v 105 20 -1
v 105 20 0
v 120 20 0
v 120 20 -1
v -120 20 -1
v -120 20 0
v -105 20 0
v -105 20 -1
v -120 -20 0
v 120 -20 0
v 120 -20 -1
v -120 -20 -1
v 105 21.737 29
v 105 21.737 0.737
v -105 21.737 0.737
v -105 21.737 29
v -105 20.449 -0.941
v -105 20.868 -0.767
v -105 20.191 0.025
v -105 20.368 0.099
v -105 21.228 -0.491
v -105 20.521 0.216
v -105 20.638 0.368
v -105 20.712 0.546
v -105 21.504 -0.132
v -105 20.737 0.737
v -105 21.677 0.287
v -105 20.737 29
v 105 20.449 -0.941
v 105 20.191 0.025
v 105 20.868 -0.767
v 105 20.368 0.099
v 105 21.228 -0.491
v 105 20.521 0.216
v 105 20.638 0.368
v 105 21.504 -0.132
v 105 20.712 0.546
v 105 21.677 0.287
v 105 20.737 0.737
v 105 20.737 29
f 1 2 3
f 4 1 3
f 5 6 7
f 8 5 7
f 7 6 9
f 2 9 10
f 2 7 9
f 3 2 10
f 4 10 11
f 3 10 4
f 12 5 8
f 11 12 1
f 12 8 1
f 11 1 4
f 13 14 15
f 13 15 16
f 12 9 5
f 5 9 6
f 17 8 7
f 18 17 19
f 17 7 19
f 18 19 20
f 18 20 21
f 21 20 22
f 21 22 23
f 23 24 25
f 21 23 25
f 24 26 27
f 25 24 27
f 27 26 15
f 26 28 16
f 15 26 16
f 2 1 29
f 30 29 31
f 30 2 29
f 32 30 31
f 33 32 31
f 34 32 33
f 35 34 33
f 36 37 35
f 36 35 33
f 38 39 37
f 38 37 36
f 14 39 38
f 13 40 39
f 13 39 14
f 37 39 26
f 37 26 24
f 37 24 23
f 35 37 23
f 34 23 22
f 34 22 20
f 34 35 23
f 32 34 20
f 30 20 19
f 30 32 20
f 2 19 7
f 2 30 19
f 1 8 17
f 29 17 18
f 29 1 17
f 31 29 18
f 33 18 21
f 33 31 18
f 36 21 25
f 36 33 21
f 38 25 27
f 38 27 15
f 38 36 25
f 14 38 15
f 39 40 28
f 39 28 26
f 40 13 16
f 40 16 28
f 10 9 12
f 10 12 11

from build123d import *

# Parameters (mm, degrees)
SKETCH_1_W             = 240
SKETCH_1_H             = 40
SM_BASE_FLANGE_1_DEPTH = 1
SM_EDGE_FLANGE_1_DEPTH = 210


# Sheet-metal steps are written as plain solids
with BuildPart() as part:
    # Sketch 1 → 基体-法兰1 (new body)
    with BuildSketch(Plane.XY):
        Rectangle(SKETCH_1_W, SKETCH_1_H)
    extrude(amount=-SM_BASE_FLANGE_1_DEPTH)

    # 边线-法兰1 section (across the edge) → 边线-法兰1 (add)
    with BuildSketch(Plane(origin=(105, 20.7366, 0), x_dir=(0, -1, 0), z_dir=(-1, 0, 0))):
        with BuildLine():
            Line((-1, 0.7366), (-1, 29))
            Line((-1, 29), (0, 29))
            Line((0, 29), (0, 0.7366))
            ThreePointArc((0, 0.7366), (0.215745145, 0.215745145), (0.7366, 0))
            Line((0.7366, 0), (0.7366, -1))
            ThreePointArc((0.7366, -1), (-0.491361636, -0.491361636), (-1, 0.7366))
        make_face()
    extrude(amount=SM_EDGE_FLANGE_1_DEPTH)


solid = part.part
